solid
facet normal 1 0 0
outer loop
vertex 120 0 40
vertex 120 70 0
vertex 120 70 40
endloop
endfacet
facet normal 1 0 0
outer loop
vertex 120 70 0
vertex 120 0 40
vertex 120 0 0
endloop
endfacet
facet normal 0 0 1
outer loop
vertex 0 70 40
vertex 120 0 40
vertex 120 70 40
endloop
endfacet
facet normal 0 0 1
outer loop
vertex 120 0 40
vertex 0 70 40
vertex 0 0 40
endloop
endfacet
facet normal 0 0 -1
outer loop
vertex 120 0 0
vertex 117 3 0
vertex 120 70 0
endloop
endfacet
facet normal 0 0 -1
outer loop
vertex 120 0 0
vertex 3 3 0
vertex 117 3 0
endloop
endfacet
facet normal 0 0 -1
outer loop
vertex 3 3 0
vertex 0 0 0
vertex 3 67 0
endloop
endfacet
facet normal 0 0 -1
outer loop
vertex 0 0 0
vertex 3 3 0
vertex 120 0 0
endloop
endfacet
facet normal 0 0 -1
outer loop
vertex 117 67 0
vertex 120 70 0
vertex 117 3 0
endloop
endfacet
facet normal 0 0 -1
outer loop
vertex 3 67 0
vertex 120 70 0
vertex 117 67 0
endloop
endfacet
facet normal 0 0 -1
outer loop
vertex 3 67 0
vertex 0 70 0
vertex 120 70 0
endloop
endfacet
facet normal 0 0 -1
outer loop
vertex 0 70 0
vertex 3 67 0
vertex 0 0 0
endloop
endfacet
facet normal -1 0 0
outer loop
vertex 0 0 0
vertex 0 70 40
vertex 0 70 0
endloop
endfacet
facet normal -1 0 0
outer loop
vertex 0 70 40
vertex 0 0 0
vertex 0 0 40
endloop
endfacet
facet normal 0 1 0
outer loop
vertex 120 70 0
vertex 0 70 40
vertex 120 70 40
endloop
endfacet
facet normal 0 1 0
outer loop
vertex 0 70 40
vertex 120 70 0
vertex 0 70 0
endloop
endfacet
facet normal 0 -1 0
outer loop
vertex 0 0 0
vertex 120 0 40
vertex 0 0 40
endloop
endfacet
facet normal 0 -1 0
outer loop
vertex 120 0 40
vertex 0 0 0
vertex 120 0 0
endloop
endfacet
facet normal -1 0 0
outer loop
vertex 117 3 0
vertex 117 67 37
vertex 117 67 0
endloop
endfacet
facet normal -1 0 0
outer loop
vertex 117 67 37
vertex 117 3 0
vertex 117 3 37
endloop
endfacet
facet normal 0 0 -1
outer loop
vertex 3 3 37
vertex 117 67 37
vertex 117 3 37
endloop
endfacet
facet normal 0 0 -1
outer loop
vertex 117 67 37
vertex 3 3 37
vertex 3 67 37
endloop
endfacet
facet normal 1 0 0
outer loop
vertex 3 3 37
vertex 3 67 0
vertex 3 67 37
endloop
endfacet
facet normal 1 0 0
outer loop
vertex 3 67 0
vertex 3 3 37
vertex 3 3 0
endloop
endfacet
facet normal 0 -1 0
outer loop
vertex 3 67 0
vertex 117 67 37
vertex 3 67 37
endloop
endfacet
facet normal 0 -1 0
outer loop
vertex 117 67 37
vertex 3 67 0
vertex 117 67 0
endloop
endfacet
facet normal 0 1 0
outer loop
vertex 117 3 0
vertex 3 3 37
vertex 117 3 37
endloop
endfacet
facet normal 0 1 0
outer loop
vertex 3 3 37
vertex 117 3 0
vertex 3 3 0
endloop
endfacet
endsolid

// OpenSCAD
difference() {
            cube([120, 70, 40]); // Outer
            translate([3, 3, 0]) cube([114, 64, 37]); // Inner Cavity (Walls/Floor)
        }
        // This creates the hollow tank.
        // Now we need to add the platform.
        // We can't use union inside difference easily to add material.
        // Better: Union of (TankWalls) and (Platform).
